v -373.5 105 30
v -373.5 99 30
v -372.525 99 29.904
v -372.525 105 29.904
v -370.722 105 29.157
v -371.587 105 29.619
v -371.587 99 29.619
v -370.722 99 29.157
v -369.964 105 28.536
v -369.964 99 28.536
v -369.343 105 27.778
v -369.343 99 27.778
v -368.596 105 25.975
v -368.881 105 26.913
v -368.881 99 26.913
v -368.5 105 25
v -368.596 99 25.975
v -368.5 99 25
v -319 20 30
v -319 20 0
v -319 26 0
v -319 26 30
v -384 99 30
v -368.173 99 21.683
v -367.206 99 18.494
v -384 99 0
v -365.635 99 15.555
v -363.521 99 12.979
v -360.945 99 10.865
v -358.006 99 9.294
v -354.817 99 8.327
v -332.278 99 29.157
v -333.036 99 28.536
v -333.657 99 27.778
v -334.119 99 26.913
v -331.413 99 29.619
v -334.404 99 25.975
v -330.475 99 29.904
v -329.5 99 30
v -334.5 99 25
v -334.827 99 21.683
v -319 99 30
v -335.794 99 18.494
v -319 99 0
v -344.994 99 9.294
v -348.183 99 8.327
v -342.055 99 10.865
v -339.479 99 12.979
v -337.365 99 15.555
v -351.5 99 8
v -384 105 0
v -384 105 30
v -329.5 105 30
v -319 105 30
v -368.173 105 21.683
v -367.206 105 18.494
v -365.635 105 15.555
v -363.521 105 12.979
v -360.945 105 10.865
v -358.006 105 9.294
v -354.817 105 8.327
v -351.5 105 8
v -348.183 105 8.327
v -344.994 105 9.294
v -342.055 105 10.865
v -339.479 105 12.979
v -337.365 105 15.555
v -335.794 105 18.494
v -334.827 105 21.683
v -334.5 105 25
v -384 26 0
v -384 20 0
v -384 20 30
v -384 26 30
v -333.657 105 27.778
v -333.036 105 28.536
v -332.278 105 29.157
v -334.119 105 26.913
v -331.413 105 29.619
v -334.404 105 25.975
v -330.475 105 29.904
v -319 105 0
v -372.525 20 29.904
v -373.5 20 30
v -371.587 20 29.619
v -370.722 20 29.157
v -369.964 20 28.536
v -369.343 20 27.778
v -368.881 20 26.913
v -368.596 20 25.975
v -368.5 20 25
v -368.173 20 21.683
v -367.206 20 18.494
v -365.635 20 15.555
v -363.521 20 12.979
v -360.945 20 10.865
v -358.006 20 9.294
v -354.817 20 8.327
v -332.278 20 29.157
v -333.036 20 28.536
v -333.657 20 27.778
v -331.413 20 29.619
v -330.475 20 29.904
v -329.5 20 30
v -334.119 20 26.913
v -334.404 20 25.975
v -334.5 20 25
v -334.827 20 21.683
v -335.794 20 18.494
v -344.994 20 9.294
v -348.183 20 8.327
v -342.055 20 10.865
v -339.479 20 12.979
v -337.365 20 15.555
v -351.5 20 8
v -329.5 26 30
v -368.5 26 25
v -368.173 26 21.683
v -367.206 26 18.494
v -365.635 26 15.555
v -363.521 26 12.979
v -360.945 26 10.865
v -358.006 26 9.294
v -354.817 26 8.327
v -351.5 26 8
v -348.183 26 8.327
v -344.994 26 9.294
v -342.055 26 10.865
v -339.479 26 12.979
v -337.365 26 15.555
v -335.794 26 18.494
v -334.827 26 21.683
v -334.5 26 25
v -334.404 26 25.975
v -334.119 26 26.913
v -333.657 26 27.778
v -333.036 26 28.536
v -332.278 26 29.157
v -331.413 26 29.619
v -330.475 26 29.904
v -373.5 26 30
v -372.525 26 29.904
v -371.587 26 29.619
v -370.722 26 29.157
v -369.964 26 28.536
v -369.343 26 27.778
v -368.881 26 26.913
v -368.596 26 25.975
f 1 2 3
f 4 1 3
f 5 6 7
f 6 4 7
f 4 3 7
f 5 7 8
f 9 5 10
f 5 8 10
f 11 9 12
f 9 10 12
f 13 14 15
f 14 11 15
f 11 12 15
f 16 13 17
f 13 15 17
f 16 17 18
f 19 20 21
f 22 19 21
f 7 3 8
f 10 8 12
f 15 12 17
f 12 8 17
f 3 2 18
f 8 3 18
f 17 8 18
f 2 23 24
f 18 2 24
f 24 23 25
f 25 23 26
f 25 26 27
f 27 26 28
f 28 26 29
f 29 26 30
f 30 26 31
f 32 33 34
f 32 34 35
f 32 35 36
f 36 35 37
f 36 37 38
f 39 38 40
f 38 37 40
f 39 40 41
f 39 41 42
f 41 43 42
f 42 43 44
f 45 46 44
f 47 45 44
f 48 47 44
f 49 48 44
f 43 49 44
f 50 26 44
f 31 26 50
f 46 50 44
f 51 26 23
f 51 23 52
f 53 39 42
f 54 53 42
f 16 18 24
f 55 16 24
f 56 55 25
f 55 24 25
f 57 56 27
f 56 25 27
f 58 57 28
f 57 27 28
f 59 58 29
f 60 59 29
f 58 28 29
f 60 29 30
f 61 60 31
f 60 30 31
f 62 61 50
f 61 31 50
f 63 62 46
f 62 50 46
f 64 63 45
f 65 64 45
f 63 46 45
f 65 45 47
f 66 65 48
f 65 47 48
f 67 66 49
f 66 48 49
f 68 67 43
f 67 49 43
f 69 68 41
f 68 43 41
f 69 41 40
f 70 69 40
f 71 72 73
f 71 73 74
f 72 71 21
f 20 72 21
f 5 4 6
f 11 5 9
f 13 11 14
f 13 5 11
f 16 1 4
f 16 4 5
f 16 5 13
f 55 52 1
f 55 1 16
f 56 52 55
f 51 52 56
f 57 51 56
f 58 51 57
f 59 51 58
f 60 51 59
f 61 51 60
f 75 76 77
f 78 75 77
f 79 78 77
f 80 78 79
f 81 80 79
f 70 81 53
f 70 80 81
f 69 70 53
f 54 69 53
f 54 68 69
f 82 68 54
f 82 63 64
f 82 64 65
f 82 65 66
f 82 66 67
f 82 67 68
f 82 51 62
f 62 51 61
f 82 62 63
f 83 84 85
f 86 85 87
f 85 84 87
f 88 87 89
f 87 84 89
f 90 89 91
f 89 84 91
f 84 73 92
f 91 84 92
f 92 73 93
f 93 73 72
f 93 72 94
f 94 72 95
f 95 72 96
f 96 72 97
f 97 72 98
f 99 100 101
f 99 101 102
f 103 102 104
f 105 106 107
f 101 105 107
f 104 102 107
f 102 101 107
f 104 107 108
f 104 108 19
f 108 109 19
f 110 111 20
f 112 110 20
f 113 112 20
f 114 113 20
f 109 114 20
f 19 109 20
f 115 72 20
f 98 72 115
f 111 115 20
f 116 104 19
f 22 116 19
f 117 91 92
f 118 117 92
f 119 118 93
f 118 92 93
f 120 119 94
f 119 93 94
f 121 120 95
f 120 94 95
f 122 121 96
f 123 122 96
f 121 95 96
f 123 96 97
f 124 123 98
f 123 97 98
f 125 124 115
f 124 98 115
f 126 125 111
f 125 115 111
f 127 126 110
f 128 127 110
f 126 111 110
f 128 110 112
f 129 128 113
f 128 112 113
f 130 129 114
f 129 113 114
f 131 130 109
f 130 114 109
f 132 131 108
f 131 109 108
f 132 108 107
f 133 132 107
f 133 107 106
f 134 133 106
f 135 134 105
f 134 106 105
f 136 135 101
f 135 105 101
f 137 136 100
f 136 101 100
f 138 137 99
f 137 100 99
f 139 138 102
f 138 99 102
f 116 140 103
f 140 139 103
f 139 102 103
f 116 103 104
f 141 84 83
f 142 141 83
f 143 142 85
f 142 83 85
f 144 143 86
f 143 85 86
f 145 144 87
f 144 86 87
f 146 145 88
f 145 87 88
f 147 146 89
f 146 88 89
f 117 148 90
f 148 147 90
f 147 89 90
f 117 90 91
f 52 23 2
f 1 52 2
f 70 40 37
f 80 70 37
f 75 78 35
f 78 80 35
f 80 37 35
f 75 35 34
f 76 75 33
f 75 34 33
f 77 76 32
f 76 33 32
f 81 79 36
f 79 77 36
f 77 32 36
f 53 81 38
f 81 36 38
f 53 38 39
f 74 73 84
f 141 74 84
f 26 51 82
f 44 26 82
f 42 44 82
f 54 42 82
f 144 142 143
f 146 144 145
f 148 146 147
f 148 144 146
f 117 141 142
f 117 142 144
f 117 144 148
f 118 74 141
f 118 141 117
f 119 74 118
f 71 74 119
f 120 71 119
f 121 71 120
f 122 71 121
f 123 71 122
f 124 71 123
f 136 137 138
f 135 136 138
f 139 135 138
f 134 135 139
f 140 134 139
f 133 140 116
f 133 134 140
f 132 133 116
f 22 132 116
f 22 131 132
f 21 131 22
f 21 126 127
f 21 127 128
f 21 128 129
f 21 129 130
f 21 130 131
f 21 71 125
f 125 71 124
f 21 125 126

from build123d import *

# Parameters (mm, degrees)
SKETCH1_W             = 65
SKETCH1_H             = 6
BOSS_EXTRUDE1_DEPTH   = 44
BOSS_EXTRUDE1_2_DEPTH = 44
CUT_EXTRUDE4_DEPTH    = 396.74865761


with BuildPart() as part:
    # Sketch1 → Boss-Extrude1 (new body)
    with BuildSketch(Plane.XY):
        with Locations((-351.5, 23)):
            Rectangle(SKETCH1_W, SKETCH1_H)
    extrude(amount=BOSS_EXTRUDE1_DEPTH)


with BuildPart() as body_2:
    # Sketch1 → Boss-Extrude1 2 (new body)
    with BuildSketch(Plane.XY):
        with Locations((-351.5, 102)):
            Rectangle(SKETCH1_W, SKETCH1_H)
    extrude(amount=BOSS_EXTRUDE1_2_DEPTH)


with BuildPart() as cut_extrude4_tool:
    # Sketch4 → Cut-Extrude4 (new, through all)
    with BuildSketch(Plane(origin=(0, 20, 0), x_dir=(-1, 0, 0), z_dir=(0, -1, 0))):
        with BuildLine():
            Line((319, -30), (319, -44))
            Line((319, -44), (384, -44))
            Line((384, -44), (384, -30))
            Line((384, -30), (373.5, -30))
            ThreePointArc((373.5, -30), (369.964466094, -28.535533906), (368.5, -25))
            ThreePointArc((368.5, -25), (351.5, -8), (334.5, -25))
            ThreePointArc((334.5, -25), (333.035533906, -28.535533906), (329.5, -30))
            Line((329.5, -30), (319, -30))
        make_face()
    extrude(amount=-CUT_EXTRUDE4_DEPTH)


with BuildPart() as part_1:
    add(part.part)

    # Cut-Extrude4: cut by cut_extrude4_tool
    add(cut_extrude4_tool.part, mode=Mode.SUBTRACT)


with BuildPart() as body_2_1:
    add(body_2.part)

    # Cut-Extrude4: cut by cut_extrude4_tool
    add(cut_extrude4_tool.part, mode=Mode.SUBTRACT)


solid = Compound([part_1.part, body_2_1.part])
